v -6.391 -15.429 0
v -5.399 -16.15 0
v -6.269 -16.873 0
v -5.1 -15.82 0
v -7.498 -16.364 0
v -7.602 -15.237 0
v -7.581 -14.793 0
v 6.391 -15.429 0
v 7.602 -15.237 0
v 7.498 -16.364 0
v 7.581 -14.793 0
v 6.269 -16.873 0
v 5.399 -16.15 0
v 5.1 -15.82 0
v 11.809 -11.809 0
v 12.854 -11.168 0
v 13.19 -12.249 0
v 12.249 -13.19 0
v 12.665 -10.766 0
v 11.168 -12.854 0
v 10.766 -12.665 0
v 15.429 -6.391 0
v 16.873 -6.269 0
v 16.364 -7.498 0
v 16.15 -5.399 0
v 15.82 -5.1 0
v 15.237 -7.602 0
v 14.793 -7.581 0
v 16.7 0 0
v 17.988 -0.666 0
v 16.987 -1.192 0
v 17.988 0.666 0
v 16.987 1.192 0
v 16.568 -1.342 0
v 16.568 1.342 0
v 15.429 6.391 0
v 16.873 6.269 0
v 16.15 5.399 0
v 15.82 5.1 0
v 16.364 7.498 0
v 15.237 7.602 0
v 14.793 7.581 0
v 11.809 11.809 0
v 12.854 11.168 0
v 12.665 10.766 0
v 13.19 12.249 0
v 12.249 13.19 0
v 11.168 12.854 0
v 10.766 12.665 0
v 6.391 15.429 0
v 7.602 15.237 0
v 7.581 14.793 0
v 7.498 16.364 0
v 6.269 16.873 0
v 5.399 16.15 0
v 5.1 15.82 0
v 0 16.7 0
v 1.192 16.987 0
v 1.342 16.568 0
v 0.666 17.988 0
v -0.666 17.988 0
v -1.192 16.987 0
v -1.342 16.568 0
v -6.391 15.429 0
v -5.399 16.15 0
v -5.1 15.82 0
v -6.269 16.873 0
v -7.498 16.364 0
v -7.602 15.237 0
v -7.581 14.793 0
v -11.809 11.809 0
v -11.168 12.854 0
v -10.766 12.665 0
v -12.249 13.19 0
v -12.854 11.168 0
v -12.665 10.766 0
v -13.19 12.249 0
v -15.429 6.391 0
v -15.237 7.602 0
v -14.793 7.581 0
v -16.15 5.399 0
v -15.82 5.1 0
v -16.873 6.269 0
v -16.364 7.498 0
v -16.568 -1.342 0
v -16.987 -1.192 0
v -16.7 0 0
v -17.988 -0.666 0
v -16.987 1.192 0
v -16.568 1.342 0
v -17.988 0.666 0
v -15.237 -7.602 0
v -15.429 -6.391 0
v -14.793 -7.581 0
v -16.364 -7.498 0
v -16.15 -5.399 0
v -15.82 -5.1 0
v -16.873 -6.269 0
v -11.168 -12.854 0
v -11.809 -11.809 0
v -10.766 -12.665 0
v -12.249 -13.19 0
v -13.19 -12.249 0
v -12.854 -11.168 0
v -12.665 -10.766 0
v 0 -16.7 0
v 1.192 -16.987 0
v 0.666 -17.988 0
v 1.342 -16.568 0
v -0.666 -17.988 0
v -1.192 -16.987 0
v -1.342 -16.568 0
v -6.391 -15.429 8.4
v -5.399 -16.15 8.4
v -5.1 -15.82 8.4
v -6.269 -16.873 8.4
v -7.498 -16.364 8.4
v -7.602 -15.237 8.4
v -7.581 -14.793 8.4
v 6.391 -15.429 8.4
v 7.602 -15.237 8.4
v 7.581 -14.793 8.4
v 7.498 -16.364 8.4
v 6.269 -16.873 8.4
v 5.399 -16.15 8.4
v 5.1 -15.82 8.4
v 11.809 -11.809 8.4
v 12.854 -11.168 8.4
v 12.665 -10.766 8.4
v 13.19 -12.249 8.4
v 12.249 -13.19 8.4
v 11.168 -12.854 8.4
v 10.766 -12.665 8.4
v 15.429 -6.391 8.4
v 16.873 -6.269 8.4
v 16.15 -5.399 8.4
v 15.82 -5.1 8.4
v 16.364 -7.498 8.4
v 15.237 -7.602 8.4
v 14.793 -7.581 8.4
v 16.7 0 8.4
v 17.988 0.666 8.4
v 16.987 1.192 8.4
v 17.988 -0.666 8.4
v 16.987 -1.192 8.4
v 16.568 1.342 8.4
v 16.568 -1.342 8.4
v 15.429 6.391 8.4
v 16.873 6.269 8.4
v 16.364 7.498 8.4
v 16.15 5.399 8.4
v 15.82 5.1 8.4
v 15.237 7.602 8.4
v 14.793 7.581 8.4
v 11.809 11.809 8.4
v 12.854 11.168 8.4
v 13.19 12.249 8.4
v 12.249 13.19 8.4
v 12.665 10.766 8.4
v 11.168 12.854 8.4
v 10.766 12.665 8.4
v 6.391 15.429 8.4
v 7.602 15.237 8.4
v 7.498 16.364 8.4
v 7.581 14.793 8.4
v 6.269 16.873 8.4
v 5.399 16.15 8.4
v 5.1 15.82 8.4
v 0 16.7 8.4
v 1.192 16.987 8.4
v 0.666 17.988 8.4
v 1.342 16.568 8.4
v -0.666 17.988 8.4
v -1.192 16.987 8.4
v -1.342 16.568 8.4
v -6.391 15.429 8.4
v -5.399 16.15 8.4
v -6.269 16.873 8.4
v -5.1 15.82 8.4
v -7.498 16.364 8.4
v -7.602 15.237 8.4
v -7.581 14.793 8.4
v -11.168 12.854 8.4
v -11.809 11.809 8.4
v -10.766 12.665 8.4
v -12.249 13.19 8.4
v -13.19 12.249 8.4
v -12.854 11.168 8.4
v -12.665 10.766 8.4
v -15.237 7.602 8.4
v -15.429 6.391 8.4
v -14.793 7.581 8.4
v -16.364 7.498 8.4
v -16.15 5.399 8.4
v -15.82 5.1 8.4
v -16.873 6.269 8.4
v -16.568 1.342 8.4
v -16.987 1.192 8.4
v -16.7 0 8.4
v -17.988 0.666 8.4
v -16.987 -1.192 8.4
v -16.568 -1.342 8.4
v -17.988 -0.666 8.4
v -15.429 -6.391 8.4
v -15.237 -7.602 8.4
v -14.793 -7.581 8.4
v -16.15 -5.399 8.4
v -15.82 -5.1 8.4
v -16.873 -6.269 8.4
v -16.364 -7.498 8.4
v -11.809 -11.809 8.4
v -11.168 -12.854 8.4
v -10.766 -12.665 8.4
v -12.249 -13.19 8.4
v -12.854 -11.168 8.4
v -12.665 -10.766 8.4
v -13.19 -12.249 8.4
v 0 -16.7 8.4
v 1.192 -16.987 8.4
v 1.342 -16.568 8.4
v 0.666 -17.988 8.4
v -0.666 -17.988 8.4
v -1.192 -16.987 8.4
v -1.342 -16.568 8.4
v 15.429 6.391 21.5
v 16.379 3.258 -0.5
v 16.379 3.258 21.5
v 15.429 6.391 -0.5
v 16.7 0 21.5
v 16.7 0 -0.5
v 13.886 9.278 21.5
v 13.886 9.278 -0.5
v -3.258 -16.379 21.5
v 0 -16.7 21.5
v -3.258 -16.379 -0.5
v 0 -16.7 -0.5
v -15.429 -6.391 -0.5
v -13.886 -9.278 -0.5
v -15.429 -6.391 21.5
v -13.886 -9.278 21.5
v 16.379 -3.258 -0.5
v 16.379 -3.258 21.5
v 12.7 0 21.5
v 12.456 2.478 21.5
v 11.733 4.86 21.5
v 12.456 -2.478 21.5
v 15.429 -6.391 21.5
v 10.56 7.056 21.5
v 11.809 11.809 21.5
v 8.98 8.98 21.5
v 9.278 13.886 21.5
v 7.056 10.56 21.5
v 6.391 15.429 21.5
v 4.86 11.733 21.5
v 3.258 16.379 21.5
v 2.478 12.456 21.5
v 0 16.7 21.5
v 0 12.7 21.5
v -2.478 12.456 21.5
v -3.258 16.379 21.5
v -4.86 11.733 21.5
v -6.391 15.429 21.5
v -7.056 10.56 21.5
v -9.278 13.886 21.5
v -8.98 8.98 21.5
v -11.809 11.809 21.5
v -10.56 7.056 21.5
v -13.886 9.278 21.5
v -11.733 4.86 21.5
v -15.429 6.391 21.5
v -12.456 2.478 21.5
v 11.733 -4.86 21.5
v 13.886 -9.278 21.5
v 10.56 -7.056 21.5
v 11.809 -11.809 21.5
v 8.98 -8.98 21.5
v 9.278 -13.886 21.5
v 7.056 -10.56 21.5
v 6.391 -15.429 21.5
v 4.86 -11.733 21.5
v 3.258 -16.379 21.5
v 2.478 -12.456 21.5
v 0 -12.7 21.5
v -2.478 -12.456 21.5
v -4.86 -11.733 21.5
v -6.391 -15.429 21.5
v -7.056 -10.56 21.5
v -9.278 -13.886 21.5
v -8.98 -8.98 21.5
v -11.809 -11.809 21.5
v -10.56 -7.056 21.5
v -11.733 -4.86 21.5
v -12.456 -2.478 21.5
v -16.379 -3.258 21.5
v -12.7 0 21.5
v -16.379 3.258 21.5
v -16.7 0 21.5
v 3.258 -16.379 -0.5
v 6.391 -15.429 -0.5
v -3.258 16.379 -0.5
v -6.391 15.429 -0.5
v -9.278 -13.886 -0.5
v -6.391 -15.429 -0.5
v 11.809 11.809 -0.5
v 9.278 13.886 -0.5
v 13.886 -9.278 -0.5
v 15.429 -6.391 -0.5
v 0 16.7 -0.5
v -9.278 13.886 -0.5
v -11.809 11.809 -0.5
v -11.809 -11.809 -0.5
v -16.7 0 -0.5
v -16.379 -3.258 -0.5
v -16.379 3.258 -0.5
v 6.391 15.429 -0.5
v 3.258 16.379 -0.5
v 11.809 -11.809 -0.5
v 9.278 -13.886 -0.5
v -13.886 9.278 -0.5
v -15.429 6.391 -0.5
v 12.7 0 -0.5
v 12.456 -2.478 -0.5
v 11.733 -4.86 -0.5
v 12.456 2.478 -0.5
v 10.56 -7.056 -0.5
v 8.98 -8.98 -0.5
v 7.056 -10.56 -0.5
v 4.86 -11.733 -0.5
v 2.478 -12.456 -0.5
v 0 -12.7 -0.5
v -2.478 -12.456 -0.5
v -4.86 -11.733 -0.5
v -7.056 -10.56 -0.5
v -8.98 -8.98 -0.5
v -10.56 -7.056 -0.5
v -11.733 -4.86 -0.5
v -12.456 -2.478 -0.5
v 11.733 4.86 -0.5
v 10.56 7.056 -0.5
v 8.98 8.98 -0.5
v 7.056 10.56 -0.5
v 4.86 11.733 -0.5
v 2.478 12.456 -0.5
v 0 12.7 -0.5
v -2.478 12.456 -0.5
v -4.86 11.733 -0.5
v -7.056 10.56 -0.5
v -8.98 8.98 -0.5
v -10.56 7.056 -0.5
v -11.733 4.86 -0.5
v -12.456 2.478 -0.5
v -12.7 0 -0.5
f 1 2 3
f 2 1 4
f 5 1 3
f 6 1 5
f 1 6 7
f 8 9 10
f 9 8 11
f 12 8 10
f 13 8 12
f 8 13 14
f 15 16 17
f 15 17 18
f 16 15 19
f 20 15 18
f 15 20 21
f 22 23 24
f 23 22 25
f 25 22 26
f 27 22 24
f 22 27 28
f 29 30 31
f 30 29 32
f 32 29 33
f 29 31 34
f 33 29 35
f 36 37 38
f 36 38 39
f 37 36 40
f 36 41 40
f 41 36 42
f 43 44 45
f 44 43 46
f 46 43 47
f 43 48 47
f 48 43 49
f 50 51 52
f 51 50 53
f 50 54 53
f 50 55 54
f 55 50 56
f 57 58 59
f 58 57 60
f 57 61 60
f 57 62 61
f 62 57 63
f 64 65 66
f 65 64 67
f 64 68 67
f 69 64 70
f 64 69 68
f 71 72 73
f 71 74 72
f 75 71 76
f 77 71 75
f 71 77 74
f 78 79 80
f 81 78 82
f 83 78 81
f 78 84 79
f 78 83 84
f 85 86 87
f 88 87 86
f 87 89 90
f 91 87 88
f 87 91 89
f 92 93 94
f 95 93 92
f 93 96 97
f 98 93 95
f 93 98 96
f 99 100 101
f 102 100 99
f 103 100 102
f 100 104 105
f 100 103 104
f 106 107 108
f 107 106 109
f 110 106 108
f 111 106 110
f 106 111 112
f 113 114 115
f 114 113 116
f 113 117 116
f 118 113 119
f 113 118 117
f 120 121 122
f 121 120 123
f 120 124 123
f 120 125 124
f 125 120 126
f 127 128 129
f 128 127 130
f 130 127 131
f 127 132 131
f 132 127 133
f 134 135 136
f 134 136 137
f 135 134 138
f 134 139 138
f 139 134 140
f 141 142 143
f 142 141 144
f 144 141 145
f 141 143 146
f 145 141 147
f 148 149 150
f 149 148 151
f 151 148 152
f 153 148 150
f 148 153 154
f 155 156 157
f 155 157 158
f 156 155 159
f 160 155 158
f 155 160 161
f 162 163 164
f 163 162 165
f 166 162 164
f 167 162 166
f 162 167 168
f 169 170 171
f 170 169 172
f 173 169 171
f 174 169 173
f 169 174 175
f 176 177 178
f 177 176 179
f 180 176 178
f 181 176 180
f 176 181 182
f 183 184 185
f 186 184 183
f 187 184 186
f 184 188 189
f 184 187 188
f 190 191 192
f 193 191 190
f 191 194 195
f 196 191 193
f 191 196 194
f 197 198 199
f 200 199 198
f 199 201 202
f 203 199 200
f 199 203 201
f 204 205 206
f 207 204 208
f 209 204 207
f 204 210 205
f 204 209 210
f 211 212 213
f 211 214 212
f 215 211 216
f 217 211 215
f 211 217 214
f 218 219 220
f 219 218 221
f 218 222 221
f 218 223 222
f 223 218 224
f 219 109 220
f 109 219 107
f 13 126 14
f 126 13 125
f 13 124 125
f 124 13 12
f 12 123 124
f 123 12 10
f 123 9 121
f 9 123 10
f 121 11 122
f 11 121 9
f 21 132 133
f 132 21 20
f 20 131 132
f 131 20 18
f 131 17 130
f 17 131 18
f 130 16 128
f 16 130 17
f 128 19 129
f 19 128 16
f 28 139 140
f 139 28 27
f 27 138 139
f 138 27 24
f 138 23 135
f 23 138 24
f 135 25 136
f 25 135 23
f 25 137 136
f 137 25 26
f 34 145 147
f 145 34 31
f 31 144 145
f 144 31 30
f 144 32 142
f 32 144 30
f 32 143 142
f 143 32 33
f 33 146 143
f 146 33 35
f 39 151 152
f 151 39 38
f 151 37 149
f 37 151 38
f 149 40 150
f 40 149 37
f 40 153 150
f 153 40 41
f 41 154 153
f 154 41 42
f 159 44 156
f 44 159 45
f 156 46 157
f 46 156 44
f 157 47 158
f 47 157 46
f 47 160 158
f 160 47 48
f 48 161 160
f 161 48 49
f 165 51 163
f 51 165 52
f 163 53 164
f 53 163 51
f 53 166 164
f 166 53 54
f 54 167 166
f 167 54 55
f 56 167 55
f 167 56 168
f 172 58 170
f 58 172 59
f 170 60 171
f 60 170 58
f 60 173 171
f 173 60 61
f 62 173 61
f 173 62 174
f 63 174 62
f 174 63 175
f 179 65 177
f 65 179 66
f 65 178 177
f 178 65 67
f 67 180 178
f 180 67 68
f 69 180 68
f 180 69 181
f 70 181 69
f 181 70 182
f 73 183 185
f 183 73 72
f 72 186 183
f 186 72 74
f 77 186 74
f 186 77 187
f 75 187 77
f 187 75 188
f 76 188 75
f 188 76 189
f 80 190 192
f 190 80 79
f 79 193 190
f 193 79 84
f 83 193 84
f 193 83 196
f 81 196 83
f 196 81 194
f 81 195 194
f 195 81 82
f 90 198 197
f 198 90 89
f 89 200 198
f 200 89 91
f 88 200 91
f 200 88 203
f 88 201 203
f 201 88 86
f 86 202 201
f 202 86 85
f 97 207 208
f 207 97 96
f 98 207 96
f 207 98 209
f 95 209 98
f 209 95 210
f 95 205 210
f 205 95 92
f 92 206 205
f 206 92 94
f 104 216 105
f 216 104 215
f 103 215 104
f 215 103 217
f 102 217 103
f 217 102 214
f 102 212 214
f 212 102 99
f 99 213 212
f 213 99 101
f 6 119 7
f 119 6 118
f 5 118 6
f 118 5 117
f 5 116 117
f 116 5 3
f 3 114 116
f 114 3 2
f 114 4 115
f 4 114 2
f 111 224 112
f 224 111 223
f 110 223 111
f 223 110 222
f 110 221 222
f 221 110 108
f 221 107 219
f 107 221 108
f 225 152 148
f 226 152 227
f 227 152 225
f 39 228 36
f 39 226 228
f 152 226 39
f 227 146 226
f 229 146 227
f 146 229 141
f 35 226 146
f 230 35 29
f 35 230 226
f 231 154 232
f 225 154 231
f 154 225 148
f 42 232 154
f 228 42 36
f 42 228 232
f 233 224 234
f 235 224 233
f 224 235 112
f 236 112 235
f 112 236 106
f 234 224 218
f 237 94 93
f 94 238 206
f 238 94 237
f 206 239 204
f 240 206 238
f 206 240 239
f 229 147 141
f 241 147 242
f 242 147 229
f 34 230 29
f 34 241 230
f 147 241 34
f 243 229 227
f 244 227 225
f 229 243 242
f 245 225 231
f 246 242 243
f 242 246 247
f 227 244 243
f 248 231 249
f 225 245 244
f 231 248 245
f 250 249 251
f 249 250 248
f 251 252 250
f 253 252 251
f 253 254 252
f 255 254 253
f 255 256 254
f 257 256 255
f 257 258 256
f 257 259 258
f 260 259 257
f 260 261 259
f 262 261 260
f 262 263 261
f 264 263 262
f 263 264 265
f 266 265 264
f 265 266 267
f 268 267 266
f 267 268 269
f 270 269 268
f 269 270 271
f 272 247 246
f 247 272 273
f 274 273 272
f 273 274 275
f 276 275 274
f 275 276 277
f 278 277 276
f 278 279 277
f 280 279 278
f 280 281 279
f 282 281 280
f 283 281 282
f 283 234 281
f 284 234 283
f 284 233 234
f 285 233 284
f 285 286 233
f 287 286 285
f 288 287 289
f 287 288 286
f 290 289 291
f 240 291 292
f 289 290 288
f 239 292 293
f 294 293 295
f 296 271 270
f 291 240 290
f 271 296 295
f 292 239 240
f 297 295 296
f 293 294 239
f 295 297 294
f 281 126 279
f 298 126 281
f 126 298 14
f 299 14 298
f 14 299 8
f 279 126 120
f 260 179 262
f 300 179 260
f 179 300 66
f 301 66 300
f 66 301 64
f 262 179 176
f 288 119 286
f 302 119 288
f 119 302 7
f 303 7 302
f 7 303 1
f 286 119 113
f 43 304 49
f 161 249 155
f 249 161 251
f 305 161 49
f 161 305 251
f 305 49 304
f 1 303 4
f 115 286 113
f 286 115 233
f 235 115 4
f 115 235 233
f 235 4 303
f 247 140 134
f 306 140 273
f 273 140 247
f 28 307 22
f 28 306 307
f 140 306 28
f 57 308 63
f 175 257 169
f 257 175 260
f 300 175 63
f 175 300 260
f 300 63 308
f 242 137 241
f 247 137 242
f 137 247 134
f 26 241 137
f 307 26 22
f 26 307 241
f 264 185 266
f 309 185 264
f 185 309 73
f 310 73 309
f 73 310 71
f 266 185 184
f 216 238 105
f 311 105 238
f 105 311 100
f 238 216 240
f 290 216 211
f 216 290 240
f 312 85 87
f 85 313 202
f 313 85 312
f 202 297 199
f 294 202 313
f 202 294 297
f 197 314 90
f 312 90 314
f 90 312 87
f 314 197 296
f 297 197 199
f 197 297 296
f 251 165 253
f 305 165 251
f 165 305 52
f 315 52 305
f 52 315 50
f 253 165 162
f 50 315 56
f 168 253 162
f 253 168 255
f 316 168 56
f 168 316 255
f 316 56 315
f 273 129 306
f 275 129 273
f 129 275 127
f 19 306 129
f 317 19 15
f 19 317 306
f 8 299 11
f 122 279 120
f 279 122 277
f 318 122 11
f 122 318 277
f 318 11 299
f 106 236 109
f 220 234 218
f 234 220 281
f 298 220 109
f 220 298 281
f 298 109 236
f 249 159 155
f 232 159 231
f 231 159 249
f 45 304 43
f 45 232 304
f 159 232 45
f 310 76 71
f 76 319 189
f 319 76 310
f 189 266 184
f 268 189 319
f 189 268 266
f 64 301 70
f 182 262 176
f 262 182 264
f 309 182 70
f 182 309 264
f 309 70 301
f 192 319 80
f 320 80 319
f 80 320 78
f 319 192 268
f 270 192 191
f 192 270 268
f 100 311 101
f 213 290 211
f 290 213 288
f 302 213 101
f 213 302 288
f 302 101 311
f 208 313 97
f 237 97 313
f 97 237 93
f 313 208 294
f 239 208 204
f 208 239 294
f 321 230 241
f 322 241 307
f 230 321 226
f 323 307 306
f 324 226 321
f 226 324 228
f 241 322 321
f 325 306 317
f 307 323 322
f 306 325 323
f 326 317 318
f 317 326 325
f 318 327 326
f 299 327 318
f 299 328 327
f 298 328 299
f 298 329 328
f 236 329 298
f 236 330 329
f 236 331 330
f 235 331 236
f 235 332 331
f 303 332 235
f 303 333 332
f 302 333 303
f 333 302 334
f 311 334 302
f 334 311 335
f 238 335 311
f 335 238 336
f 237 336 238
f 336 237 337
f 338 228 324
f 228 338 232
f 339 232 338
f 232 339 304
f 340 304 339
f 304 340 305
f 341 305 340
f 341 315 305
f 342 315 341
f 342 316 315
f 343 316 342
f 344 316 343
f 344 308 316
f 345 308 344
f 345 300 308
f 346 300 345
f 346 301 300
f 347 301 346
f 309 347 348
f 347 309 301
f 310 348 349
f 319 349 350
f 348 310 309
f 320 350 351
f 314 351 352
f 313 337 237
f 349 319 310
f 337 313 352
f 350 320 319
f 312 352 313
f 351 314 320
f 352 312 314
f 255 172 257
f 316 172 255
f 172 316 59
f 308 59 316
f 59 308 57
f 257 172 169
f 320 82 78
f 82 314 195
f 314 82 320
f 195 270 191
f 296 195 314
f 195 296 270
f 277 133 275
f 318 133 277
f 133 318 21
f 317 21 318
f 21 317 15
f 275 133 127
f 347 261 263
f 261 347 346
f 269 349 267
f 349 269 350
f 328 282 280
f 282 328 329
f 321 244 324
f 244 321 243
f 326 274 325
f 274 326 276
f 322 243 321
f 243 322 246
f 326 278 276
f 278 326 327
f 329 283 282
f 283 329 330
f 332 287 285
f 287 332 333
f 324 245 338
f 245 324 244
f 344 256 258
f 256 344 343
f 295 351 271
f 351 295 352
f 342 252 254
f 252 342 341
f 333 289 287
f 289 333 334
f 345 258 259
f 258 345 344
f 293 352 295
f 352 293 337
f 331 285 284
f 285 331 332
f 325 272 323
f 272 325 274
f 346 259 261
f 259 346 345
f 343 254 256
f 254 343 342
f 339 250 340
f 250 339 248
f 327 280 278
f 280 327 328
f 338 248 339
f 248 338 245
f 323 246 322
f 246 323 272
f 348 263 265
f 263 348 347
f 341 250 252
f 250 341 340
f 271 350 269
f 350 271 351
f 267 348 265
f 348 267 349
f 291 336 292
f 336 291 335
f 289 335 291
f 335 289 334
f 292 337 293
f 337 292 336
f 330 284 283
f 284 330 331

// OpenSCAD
$fn = 32;

// ----------------------------------------------------------------------
// Two-module gear rim: z16 m2 and z20 m1.2, 21 mm wide
// ----------------------------------------------------------------------

// --- parameters (mm) ---
module_a = 2;             // first tooth module
teeth_a = 16;             // first band tooth count
module_b = 1.2;           // second tooth module
teeth_b = 20;             // second band tooth count
band_h = 8;               // height of one tooth band
web_t = 5;                // web thickness between the bands
total = 21;               // overall width over both bands
root_r = 13.5;            // root radius of the coarse band
hub_r = 16.7;             // hub radius
bore_d = 25.4;            // hub bore
hole_count = 6;           // lightening holes
hole_r = 9.75;            // lightening hole circle radius
hole_d = 4;               // lightening hole diameter

band_a = [[13.414, -1.521], [15.981, -1.553], [16.987, -1.192], [17.988, -0.666], [17.988, 0.666], [16.987, 1.192], [15.981, 1.553], [13.414, 1.521], [12.975, 3.728], [15.359, 4.681], [16.15, 5.399], [16.873, 6.269], [16.364, 7.498], [15.237, 7.602], [14.171, 7.551], [11.811, 6.538], [10.561, 8.41], [12.399, 10.202], [12.854, 11.168], [13.19, 12.249], [12.249, 13.19], [11.168, 12.854], [10.202, 12.399], [8.41, 10.561], [6.538, 11.811], [7.551, 14.171], [7.602, 15.237], [7.498, 16.364], [6.269, 16.873], [5.399, 16.15], [4.681, 15.359], [3.728, 12.975], [1.521, 13.414], [1.553, 15.981], [1.192, 16.987], [0.666, 17.988], [-0.666, 17.988], [-1.192, 16.987], [-1.553, 15.981], [-1.521, 13.414], [-3.728, 12.975], [-4.681, 15.359], [-5.399, 16.15], [-6.269, 16.873], [-7.498, 16.364], [-7.602, 15.237], [-7.551, 14.171], [-6.538, 11.811], [-8.41, 10.561], [-10.202, 12.399], [-11.168, 12.854], [-12.249, 13.19], [-13.19, 12.249], [-12.854, 11.168], [-12.399, 10.202], [-10.561, 8.41], [-11.811, 6.538], [-14.171, 7.551], [-15.237, 7.602], [-16.364, 7.498], [-16.873, 6.269], [-16.15, 5.399], [-15.359, 4.681], [-12.975, 3.728], [-13.414, 1.521], [-15.981, 1.553], [-16.987, 1.192], [-17.988, 0.666], [-17.988, -0.666], [-16.987, -1.192], [-15.981, -1.553], [-13.414, -1.521], [-12.975, -3.728], [-15.359, -4.681], [-16.15, -5.399], [-16.873, -6.269], [-16.364, -7.498], [-15.237, -7.602], [-14.171, -7.551], [-11.811, -6.538], [-10.561, -8.41], [-12.399, -10.202], [-12.854, -11.168], [-13.19, -12.249], [-12.249, -13.19], [-11.168, -12.854], [-10.202, -12.399], [-8.41, -10.561], [-6.538, -11.811], [-7.551, -14.171], [-7.602, -15.237], [-7.498, -16.364], [-6.269, -16.873], [-5.399, -16.15], [-4.681, -15.359], [-3.728, -12.975], [-1.521, -13.414], [-1.553, -15.981], [-1.192, -16.987], [-0.666, -17.988], [0.666, -17.988], [1.192, -16.987], [1.553, -15.981], [1.521, -13.414], [3.728, -12.975], [4.681, -15.359], [5.399, -16.15], [6.269, -16.873], [7.498, -16.364], [7.602, -15.237], [7.551, -14.171], [6.538, -11.811], [8.41, -10.561], [10.202, -12.399], [11.168, -12.854], [12.249, -13.19], [13.19, -12.249], [12.854, -11.168], [12.399, -10.202], [10.561, -8.41], [11.811, -6.538], [14.171, -7.551], [15.237, -7.602], [16.364, -7.498], [16.873, -6.269], [16.15, -5.399], [15.359, -4.681], [12.975, -3.728]];
band_b = [[10.454, -0.977], [11.913, -0.955], [12.554, -0.733], [13.193, -0.417], [13.193, 0.417], [12.554, 0.733], [11.913, 0.955], [10.454, 0.977], [10.245, 2.302], [11.625, 2.773], [12.166, 3.182], [12.677, 3.681], [12.419, 4.473], [11.713, 4.577], [11.034, 4.59], [9.641, 4.16], [9.032, 5.355], [10.199, 6.229], [10.587, 6.786], [10.919, 7.418], [10.429, 8.092], [9.725, 7.972], [9.076, 7.775], [7.884, 6.935], [6.935, 7.884], [7.775, 9.076], [7.972, 9.725], [8.092, 10.429], [7.418, 10.919], [6.786, 10.587], [6.229, 10.199], [5.355, 9.032], [4.16, 9.641], [4.59, 11.034], [4.577, 11.713], [4.473, 12.419], [3.681, 12.677], [3.182, 12.166], [2.773, 11.625], [2.302, 10.245], [0.977, 10.454], [0.955, 11.913], [0.733, 12.554], [0.417, 13.193], [-0.417, 13.193], [-0.733, 12.554], [-0.955, 11.913], [-0.977, 10.454], [-2.302, 10.245], [-2.773, 11.625], [-3.182, 12.166], [-3.681, 12.677], [-4.473, 12.419], [-4.577, 11.713], [-4.59, 11.034], [-4.16, 9.641], [-5.355, 9.032], [-6.229, 10.199], [-6.786, 10.587], [-7.418, 10.919], [-8.092, 10.429], [-7.972, 9.725], [-7.775, 9.076], [-6.935, 7.884], [-7.884, 6.935], [-9.076, 7.775], [-9.725, 7.972], [-10.429, 8.092], [-10.919, 7.418], [-10.587, 6.786], [-10.199, 6.229], [-9.032, 5.355], [-9.641, 4.16], [-11.034, 4.59], [-11.713, 4.577], [-12.419, 4.473], [-12.677, 3.681], [-12.166, 3.182], [-11.625, 2.773], [-10.245, 2.302], [-10.454, 0.977], [-11.913, 0.955], [-12.554, 0.733], [-13.193, 0.417], [-13.193, -0.417], [-12.554, -0.733], [-11.913, -0.955], [-10.454, -0.977], [-10.245, -2.302], [-11.625, -2.773], [-12.166, -3.182], [-12.677, -3.681], [-12.419, -4.473], [-11.713, -4.577], [-11.034, -4.59], [-9.641, -4.16], [-9.032, -5.355], [-10.199, -6.229], [-10.587, -6.786], [-10.919, -7.418], [-10.429, -8.092], [-9.725, -7.972], [-9.076, -7.775], [-7.884, -6.935], [-6.935, -7.884], [-7.775, -9.076], [-7.972, -9.725], [-8.092, -10.429], [-7.418, -10.919], [-6.786, -10.587], [-6.229, -10.199], [-5.355, -9.032], [-4.16, -9.641], [-4.59, -11.034], [-4.577, -11.713], [-4.473, -12.419], [-3.681, -12.677], [-3.182, -12.166], [-2.773, -11.625], [-2.302, -10.245], [-0.977, -10.454], [-0.955, -11.913], [-0.733, -12.554], [-0.417, -13.193], [0.417, -13.193], [0.733, -12.554], [0.955, -11.913], [0.977, -10.454], [2.302, -10.245], [2.773, -11.625], [3.182, -12.166], [3.681, -12.677], [4.473, -12.419], [4.577, -11.713], [4.59, -11.034], [4.16, -9.641], [5.355, -9.032], [6.229, -10.199], [6.786, -10.587], [7.418, -10.919], [8.092, -10.429], [7.972, -9.725], [7.775, -9.076], [6.935, -7.884], [7.884, -6.935], [9.076, -7.775], [9.725, -7.972], [10.429, -8.092], [10.919, -7.418], [10.587, -6.786], [10.199, -6.229], [9.032, -5.355], [9.641, -4.16], [11.034, -4.59], [11.713, -4.577], [12.419, -4.473], [12.677, -3.681], [12.166, -3.182], [11.625, -2.773], [10.245, -2.302]];

difference() {
  union() {
    /* tooth band A, overlapping the web by 0.4 mm */
    linear_extrude(height = band_h + 0.4) polygon(band_a);
    /* web */
    translate([0, 0, band_h - 0.4]) cylinder(h = web_t + 0.8, d = 2 * root_r);
    /* tooth band B */
    translate([0, 0, band_h + web_t]) linear_extrude(height = band_h + 0.4) polygon(band_b);
    /* hub */
    translate([0, 0, -0.5]) cylinder(h = total + 1.0, d = 2 * hub_r);
  }
  /* bore */
  translate([0, 0, -2.5]) cylinder(h = total + 5, d = bore_d);
  /* lightening holes through the web */
  for (i = [0 : hole_count - 1]) {
    a = i * 360 / hole_count;
    translate([hole_r * cos(a), hole_r * sin(a), -2.5]) cylinder(h = total + 5, d = hole_d);
  }
}
